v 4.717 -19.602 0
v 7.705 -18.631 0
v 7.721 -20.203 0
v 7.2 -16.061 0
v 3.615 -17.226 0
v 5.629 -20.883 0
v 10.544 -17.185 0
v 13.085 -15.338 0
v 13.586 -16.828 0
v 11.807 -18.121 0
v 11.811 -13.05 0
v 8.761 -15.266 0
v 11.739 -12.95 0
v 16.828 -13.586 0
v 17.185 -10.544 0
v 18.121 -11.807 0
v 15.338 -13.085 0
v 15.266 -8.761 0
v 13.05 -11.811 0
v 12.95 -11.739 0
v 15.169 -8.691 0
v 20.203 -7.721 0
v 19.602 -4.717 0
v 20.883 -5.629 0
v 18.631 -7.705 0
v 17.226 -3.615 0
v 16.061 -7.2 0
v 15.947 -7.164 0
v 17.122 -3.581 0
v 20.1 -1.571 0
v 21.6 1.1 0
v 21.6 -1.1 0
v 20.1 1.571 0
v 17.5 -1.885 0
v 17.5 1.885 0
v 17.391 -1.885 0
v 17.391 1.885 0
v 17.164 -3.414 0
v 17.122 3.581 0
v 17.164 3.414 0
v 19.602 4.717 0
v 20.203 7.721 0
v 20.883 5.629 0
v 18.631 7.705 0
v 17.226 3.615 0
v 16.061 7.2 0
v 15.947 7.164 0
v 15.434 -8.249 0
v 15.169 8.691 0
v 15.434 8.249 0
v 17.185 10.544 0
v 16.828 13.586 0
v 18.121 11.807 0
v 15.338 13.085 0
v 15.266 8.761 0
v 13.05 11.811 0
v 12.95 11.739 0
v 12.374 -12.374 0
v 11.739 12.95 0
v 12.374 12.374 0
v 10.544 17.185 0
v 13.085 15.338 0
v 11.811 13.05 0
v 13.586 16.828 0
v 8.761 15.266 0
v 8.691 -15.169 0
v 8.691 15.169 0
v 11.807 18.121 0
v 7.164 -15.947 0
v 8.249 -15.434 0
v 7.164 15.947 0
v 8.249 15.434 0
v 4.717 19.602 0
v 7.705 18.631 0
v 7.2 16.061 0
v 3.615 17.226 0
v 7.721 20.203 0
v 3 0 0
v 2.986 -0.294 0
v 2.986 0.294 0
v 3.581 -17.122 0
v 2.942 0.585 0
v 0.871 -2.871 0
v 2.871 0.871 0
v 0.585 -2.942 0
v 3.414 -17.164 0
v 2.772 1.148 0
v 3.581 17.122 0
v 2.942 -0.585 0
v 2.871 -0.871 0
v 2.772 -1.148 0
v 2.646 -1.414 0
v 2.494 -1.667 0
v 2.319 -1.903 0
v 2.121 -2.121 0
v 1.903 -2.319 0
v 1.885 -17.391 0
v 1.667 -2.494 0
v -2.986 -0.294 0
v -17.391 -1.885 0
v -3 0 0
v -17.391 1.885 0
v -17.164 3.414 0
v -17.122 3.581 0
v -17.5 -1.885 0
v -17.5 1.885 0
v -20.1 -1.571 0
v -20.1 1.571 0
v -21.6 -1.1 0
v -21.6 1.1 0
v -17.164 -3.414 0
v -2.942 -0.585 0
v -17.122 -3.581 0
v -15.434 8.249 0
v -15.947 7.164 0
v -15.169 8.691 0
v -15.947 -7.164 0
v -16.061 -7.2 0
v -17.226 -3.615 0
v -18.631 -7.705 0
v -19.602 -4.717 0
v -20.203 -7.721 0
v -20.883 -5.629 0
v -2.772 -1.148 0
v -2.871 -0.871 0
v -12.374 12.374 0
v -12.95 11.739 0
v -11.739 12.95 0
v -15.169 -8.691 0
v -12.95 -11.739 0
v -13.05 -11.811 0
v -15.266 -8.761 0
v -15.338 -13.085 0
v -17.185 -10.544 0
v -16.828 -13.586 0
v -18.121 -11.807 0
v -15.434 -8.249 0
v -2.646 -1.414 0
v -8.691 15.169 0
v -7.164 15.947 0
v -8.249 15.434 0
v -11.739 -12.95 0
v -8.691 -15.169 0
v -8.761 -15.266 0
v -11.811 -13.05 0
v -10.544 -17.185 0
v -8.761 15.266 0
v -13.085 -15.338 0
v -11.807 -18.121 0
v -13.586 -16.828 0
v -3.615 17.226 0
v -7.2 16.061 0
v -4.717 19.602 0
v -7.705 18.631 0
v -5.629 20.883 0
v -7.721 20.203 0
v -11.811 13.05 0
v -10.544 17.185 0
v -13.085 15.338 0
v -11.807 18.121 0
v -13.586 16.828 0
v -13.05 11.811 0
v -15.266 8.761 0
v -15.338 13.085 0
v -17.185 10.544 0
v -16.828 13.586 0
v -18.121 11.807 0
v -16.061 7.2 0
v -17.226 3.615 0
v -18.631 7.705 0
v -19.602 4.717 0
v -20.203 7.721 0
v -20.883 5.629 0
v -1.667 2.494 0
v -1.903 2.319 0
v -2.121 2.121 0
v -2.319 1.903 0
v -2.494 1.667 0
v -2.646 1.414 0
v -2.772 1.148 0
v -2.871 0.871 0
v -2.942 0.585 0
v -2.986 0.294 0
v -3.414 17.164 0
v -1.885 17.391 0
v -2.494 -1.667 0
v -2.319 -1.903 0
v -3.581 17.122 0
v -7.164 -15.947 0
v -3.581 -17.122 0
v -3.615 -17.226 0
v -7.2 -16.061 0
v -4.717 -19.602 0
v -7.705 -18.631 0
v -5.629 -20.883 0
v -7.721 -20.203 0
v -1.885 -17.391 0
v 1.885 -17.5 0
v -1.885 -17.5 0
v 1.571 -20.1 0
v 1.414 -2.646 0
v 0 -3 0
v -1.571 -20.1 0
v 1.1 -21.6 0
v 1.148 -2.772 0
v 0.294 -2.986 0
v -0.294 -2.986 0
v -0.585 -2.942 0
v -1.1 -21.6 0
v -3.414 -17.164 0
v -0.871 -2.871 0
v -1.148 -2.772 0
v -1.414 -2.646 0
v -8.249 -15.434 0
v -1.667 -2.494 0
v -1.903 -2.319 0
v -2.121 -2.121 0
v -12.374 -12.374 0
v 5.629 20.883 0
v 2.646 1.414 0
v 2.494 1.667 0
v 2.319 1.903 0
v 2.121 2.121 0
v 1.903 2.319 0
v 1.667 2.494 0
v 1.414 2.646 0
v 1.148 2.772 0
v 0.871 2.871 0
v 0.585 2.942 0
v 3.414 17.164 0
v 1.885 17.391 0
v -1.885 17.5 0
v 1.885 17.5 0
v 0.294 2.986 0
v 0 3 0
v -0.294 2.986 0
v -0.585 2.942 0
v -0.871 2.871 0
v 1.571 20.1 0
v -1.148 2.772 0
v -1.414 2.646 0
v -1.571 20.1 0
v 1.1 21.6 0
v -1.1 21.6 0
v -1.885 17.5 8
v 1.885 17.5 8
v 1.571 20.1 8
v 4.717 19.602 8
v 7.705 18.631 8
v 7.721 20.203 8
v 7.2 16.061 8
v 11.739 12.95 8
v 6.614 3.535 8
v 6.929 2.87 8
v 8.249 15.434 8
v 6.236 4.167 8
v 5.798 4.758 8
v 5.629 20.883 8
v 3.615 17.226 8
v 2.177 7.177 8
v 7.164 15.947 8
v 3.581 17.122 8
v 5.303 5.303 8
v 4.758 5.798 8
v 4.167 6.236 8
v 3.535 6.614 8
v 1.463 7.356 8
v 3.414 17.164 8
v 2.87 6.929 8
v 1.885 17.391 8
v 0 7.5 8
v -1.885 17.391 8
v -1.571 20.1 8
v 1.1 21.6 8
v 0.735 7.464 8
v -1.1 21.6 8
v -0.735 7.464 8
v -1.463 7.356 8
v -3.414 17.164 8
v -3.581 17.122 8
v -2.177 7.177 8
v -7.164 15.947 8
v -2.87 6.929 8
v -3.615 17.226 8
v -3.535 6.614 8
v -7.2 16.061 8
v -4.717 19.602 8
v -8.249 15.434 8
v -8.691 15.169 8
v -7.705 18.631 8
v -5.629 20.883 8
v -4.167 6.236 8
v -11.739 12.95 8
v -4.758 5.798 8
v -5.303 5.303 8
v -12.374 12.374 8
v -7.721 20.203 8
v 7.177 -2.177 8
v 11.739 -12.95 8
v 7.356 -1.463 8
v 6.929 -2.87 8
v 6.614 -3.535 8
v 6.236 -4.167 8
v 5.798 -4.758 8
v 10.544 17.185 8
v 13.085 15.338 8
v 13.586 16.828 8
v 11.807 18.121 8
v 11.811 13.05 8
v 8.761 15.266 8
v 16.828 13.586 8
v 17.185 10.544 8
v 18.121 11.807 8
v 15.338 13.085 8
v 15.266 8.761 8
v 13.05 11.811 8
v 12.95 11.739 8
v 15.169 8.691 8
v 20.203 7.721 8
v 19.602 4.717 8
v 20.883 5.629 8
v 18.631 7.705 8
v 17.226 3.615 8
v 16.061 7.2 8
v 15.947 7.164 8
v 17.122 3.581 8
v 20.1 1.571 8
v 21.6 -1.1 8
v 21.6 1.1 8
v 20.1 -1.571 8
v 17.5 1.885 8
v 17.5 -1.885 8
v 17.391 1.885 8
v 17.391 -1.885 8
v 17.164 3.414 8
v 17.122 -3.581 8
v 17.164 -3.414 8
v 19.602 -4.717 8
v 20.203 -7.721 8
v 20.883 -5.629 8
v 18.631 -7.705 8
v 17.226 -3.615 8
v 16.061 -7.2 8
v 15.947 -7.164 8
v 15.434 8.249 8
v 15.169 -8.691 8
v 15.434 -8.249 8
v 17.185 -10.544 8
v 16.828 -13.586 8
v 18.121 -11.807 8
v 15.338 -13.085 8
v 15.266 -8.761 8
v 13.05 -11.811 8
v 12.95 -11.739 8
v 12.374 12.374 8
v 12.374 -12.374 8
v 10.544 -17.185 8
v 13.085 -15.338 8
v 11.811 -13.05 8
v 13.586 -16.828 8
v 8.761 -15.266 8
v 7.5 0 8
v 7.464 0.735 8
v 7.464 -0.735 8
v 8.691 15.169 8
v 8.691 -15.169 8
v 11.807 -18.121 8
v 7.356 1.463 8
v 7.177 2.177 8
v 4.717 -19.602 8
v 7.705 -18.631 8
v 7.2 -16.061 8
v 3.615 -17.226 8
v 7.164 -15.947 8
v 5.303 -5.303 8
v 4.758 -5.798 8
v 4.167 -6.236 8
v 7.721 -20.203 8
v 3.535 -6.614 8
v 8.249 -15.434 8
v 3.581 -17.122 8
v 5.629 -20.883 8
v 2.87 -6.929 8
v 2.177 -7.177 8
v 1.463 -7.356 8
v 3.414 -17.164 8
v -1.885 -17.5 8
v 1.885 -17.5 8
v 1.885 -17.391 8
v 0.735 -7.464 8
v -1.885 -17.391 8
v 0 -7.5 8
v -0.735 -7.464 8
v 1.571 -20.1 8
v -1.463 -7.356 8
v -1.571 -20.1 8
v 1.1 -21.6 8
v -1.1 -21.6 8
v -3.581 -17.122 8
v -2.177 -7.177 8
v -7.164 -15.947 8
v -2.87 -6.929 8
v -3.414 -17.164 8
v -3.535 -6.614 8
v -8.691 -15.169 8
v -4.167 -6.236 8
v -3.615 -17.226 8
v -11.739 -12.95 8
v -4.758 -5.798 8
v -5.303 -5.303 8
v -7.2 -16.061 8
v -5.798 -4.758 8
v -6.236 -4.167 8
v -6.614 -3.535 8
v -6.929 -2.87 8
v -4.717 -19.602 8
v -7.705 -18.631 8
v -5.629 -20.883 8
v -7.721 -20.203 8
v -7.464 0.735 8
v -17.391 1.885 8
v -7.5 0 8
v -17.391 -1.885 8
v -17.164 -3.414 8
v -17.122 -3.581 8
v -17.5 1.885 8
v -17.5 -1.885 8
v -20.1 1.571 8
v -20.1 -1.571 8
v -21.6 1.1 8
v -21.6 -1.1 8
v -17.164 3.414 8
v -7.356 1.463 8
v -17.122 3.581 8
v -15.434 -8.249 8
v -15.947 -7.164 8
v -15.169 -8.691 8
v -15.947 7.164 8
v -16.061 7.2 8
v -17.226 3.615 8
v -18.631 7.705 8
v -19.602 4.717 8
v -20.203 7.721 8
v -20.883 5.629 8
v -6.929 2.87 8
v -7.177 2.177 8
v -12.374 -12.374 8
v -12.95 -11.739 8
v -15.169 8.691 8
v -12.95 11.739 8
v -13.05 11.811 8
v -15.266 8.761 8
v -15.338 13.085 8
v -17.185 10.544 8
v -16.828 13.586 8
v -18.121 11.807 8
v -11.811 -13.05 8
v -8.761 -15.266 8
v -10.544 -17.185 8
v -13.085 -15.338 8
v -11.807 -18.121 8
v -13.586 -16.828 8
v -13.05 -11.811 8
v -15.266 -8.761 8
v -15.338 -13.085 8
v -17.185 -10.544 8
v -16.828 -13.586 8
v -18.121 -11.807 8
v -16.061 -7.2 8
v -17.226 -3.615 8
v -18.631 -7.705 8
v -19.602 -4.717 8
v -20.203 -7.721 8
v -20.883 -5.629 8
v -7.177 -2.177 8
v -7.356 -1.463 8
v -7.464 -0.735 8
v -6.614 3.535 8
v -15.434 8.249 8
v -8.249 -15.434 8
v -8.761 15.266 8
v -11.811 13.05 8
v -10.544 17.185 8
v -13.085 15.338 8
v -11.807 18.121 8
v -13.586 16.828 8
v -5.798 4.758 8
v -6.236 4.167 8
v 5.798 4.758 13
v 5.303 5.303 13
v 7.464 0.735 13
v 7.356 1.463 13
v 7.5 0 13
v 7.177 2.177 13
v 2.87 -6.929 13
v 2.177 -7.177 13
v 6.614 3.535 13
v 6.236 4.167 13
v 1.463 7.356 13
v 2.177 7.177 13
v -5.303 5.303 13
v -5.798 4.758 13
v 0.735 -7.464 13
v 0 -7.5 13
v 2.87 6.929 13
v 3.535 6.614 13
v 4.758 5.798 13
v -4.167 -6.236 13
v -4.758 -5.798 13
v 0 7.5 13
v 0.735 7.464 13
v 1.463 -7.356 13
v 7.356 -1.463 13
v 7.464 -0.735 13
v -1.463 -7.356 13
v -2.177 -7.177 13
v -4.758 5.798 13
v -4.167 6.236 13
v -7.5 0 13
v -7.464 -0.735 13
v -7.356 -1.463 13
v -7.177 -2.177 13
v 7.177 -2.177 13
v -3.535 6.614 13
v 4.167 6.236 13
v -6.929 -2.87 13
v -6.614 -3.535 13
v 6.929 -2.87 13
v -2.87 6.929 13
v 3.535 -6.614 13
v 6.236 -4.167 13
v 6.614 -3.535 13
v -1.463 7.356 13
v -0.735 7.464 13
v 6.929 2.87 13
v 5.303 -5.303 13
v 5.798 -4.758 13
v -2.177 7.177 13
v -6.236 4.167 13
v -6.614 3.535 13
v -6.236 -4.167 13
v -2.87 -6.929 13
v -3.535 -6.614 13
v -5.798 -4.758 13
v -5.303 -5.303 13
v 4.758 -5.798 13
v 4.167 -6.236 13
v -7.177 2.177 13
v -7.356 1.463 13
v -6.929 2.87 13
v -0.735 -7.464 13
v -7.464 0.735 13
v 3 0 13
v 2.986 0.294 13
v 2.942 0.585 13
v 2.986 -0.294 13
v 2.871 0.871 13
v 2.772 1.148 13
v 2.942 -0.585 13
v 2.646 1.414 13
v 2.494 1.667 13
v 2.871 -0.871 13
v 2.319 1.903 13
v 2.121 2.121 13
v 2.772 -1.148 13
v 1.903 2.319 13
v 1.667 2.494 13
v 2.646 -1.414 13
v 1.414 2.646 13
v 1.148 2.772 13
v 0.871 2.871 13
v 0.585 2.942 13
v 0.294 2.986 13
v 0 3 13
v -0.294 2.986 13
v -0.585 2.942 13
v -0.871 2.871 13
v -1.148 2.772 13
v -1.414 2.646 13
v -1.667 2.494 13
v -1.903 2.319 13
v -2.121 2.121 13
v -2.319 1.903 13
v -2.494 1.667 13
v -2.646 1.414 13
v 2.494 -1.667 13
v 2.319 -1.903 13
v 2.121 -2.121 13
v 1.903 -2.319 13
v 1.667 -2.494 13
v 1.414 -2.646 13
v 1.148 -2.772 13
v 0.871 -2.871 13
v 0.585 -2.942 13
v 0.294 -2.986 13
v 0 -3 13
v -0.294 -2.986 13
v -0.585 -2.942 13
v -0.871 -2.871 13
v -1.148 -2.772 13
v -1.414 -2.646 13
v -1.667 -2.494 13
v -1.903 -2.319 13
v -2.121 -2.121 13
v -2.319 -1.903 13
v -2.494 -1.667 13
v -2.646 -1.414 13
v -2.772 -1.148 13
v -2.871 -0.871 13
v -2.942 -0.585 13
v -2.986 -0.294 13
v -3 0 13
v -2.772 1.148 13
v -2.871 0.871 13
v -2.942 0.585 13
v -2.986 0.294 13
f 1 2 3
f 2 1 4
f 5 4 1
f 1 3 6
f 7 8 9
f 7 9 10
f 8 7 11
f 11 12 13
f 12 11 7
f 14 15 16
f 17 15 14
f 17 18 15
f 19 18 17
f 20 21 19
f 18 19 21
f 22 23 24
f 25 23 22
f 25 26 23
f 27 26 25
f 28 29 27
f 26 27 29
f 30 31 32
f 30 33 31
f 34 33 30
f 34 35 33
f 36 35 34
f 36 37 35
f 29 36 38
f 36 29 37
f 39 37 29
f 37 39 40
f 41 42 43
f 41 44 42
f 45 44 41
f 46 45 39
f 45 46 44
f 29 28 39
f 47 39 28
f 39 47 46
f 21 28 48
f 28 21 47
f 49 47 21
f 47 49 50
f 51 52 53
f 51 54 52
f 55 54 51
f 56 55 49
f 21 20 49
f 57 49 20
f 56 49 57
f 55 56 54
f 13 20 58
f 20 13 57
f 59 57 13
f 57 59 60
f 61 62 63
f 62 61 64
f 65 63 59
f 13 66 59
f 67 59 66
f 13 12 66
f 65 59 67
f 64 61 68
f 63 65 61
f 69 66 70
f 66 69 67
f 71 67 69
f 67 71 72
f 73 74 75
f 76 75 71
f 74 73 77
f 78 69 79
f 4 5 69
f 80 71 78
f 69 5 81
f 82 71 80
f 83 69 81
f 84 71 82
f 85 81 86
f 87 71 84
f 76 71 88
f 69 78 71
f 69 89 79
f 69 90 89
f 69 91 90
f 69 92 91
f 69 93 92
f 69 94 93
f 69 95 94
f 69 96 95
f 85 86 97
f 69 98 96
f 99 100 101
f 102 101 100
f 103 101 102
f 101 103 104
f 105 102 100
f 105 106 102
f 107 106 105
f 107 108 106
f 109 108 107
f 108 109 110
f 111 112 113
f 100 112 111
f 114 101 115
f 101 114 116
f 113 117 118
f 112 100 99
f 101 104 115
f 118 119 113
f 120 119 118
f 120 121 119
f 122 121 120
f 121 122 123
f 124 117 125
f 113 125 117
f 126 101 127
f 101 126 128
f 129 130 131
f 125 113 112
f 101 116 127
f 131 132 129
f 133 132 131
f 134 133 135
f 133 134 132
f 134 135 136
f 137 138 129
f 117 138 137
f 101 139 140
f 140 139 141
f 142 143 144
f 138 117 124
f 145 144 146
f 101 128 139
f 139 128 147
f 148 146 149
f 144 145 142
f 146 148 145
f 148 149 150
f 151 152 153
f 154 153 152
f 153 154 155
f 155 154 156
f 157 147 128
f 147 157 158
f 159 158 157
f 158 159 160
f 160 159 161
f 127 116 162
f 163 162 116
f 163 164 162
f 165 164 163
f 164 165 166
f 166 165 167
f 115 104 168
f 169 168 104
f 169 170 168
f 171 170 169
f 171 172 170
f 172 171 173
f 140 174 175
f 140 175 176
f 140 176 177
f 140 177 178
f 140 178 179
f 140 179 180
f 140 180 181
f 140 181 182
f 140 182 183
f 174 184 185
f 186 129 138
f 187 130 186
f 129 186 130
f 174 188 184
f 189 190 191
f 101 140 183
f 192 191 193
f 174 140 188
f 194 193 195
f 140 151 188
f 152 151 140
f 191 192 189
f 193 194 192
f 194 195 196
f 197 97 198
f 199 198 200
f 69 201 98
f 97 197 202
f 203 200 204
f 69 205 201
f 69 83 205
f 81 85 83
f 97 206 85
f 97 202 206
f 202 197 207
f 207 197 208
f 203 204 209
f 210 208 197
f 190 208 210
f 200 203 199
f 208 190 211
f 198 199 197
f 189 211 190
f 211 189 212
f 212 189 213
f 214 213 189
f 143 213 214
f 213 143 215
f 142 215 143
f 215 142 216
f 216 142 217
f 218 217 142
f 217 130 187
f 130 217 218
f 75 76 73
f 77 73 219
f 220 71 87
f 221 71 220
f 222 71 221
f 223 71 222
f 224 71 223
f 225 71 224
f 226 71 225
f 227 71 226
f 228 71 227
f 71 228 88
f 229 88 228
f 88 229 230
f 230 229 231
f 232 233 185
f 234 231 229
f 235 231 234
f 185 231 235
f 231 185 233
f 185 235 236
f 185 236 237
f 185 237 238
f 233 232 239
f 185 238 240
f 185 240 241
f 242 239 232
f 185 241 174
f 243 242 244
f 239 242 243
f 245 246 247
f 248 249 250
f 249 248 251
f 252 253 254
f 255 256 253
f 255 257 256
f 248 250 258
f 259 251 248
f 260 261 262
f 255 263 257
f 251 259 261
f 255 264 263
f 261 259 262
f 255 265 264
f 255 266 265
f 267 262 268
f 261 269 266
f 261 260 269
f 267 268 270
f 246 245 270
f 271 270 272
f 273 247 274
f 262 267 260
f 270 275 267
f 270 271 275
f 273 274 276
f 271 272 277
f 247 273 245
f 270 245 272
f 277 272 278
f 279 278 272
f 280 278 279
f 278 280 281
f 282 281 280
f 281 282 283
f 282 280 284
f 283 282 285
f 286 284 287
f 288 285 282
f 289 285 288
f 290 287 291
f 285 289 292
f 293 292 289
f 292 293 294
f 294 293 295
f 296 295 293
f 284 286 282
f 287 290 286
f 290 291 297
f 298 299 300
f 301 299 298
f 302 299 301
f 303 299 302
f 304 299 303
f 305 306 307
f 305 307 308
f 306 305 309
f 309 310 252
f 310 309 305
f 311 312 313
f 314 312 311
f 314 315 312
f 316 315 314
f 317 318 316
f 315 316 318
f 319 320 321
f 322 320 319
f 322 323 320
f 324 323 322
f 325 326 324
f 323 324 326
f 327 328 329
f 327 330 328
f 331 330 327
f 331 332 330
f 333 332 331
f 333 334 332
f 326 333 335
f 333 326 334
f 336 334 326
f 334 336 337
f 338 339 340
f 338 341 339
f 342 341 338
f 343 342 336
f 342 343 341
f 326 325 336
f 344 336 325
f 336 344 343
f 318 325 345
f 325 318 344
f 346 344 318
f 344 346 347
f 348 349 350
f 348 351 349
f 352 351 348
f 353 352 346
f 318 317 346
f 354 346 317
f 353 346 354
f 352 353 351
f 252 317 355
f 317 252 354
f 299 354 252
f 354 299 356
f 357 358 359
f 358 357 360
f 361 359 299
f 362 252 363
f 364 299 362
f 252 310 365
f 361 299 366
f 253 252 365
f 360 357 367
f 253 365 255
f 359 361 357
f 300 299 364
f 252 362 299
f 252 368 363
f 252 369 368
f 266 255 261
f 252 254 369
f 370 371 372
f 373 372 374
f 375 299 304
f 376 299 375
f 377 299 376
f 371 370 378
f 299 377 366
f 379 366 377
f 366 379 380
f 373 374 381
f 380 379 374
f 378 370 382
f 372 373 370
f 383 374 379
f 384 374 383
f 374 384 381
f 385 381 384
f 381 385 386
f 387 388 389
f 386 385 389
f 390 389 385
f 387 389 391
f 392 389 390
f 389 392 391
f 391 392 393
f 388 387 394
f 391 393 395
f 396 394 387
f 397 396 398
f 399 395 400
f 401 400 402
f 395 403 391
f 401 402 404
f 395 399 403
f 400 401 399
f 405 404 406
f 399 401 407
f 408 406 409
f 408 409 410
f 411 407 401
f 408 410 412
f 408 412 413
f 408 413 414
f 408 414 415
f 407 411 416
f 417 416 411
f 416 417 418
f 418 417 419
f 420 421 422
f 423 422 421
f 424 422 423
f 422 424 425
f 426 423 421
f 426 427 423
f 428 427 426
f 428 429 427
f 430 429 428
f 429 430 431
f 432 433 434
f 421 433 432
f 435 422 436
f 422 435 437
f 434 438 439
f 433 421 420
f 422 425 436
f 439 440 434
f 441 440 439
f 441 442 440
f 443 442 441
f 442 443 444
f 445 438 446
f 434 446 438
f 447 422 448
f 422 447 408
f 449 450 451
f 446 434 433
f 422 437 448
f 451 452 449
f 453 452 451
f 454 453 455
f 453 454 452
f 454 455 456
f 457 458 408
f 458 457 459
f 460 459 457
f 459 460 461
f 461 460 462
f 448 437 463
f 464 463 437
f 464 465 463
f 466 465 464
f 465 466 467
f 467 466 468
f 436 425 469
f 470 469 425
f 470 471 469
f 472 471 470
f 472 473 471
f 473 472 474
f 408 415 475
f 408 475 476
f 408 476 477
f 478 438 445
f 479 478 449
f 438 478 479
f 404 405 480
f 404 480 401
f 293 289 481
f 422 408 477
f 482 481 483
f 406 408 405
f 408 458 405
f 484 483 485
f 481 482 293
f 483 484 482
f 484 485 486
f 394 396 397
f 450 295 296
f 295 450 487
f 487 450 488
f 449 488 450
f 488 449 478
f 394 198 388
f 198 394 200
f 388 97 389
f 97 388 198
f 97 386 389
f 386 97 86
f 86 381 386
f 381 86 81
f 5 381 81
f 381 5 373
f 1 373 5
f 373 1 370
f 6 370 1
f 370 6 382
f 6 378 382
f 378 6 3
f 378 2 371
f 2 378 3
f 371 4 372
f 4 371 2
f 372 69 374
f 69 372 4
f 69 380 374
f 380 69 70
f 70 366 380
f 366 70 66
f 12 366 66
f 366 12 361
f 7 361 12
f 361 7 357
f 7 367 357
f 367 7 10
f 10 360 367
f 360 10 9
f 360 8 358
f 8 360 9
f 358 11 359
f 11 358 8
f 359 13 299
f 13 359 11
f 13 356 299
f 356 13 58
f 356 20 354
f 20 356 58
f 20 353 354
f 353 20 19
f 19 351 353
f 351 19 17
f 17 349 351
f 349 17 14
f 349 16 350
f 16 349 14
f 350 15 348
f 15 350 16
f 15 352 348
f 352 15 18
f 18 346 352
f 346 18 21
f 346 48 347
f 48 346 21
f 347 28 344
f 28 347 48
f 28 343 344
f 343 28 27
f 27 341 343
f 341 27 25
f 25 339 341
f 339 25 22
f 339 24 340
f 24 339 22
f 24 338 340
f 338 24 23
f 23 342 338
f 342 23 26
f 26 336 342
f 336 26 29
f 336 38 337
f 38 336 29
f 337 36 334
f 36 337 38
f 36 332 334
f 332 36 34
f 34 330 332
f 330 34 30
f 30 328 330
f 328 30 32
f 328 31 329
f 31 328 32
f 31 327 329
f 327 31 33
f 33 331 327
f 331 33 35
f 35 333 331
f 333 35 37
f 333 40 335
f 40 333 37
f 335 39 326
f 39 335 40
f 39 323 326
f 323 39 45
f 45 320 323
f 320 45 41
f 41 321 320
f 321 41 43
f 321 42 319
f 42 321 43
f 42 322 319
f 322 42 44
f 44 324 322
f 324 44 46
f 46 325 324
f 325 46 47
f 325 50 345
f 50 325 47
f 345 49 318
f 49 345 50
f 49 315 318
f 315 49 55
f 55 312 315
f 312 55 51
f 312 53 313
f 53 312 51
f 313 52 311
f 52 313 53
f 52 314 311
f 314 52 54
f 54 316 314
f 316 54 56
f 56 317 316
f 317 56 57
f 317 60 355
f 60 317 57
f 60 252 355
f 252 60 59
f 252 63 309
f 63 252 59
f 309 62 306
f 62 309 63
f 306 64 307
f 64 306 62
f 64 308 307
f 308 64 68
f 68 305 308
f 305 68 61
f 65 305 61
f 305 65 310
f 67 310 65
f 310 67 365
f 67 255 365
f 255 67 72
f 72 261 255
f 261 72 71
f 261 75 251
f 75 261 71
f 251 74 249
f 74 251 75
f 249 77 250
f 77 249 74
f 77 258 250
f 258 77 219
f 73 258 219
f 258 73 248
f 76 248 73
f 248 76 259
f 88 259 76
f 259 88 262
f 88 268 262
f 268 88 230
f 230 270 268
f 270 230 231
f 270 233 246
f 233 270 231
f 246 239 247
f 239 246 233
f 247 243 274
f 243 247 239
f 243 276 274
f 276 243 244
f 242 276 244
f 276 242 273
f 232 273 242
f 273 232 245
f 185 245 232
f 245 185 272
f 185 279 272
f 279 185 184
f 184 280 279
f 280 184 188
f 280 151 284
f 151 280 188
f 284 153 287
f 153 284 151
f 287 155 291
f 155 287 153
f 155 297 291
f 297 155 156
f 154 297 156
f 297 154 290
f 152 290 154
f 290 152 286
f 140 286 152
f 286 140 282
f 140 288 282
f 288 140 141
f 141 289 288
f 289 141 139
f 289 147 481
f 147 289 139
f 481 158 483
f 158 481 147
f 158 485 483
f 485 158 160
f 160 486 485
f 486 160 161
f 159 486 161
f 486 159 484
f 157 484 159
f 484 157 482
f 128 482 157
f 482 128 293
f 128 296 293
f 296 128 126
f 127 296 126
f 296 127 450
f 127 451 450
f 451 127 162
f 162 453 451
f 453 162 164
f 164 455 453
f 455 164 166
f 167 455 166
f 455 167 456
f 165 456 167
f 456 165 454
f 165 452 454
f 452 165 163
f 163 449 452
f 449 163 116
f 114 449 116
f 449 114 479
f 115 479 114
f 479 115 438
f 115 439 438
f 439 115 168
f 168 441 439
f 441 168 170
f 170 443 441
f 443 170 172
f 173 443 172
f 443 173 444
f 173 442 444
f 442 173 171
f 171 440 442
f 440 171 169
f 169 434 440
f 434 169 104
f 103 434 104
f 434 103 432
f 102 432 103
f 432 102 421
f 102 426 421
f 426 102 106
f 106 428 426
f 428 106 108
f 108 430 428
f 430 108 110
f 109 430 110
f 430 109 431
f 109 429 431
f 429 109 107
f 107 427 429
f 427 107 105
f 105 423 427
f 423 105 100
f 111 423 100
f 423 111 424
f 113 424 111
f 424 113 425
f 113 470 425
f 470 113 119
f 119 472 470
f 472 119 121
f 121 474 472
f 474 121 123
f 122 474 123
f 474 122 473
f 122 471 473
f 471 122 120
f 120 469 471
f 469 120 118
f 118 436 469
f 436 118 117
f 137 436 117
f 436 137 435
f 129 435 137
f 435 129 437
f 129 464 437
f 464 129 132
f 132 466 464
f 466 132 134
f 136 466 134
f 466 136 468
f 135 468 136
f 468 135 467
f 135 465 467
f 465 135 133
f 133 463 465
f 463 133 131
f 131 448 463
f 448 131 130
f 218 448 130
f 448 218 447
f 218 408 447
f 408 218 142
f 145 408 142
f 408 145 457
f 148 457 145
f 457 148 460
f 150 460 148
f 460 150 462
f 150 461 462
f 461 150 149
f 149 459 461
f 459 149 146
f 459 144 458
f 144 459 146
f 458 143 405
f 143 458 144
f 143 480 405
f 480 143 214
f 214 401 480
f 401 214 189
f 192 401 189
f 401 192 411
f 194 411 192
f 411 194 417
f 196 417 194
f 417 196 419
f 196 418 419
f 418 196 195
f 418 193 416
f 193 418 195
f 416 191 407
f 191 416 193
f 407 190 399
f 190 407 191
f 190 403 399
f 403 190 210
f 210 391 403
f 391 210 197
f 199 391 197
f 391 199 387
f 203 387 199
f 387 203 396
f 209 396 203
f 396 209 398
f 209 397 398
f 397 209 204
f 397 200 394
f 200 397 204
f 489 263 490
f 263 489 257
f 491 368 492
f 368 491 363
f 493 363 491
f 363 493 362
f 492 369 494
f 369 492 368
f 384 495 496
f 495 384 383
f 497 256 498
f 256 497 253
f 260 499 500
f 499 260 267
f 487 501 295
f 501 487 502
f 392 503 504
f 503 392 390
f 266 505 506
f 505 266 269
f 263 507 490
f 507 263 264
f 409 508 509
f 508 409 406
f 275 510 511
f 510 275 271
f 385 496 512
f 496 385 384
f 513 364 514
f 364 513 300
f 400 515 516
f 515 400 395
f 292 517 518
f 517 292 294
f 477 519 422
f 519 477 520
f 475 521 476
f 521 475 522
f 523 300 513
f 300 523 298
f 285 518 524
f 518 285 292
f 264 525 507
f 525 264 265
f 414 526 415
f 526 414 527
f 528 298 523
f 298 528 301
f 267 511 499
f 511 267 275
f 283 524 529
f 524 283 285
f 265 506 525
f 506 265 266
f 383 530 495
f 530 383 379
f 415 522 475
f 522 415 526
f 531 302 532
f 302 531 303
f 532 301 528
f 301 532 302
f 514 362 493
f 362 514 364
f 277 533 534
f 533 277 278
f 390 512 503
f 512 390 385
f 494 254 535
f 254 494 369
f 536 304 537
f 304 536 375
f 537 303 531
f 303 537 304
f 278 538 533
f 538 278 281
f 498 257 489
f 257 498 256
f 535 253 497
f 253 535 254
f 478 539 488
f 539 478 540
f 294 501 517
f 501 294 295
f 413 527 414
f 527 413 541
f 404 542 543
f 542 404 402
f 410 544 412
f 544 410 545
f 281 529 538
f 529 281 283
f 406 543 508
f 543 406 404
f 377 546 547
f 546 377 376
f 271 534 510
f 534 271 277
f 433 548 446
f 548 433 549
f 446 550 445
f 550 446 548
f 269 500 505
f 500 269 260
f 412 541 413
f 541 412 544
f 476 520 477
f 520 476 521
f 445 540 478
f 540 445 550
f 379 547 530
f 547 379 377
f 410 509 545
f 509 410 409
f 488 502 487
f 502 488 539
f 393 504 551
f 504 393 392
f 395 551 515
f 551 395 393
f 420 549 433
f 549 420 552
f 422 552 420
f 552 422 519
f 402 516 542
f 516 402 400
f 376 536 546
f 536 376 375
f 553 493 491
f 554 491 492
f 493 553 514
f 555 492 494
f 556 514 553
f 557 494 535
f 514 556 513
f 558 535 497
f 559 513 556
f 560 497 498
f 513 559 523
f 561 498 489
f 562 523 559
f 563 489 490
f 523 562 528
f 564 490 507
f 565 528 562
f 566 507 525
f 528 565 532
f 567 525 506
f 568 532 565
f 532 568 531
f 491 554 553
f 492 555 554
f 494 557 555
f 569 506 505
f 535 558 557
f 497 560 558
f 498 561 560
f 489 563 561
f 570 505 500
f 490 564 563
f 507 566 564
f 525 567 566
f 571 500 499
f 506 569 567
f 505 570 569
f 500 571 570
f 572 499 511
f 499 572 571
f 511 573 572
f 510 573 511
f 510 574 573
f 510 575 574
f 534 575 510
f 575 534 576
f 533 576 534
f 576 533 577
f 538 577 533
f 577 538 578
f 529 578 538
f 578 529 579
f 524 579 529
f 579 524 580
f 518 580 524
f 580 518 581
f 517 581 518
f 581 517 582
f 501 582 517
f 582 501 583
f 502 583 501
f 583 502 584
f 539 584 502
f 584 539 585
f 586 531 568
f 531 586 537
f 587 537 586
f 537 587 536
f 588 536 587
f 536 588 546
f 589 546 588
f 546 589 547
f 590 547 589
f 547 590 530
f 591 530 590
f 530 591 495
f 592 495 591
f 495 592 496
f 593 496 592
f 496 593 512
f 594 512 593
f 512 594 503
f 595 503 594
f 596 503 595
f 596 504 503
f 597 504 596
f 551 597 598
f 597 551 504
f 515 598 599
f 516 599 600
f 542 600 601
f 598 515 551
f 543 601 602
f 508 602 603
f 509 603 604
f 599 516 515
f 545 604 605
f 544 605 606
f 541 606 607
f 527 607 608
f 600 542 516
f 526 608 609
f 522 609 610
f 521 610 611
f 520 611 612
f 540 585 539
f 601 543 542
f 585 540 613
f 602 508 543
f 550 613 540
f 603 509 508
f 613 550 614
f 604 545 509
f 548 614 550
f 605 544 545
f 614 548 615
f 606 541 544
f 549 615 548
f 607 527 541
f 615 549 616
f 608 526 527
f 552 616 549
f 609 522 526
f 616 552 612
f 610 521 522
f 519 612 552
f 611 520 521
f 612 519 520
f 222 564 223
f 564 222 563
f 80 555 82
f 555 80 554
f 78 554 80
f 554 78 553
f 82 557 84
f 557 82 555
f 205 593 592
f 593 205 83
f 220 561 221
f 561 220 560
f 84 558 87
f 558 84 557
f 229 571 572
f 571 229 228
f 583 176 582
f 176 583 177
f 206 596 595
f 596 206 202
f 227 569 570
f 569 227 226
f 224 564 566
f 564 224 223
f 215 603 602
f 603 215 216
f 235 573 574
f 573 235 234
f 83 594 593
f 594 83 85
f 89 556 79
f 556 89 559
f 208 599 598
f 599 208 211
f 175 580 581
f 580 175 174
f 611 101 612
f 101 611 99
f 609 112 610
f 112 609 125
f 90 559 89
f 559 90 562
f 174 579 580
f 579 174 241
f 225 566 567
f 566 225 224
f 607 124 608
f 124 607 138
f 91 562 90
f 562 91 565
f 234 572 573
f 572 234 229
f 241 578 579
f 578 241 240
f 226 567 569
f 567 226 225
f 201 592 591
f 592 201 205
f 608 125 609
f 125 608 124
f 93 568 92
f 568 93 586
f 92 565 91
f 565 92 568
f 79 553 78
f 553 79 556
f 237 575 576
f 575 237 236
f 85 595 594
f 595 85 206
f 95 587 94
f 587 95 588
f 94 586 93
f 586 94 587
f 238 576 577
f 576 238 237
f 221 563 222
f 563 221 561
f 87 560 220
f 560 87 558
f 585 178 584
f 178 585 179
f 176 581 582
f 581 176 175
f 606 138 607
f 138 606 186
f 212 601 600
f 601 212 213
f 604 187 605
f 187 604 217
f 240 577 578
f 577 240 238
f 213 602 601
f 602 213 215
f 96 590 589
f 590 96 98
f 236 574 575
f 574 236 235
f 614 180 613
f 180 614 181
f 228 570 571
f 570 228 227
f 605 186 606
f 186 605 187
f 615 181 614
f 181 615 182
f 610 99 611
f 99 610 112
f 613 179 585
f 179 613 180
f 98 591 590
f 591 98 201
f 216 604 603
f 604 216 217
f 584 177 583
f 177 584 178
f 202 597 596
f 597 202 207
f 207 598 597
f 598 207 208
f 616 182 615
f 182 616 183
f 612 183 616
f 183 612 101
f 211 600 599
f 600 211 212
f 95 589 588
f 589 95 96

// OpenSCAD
// Parametric involute spur gear
// Proper involute tooth profile for meshing gears

num_teeth = 20;
module_size = 2;  // Metric module (pitch diameter / teeth)
pressure_angle = 20;
gear_thickness = 8;
shaft_diameter = 6;
hub_diameter = 15;
hub_height = 5;

$fn = 64;

// Derived dimensions
pitch_diameter = num_teeth * module_size;
outer_diameter = pitch_diameter + 2 * module_size;
root_diameter = pitch_diameter - 2.5 * module_size;

module involute_gear() {
    difference() {
        union() {
            // Gear body with teeth
            linear_extrude(height=gear_thickness)
            gear_2d();
            
            // Hub
            cylinder(d=hub_diameter, h=gear_thickness + hub_height);
        }
        
        // Shaft hole
        translate([0, 0, -1])
        cylinder(d=shaft_diameter, h=gear_thickness + hub_height + 2);
    }
}

module gear_2d() {
    difference() {
        union() {
            circle(d=root_diameter);
            for (i = [0:num_teeth-1]) {
                rotate([0, 0, i * 360/num_teeth])
                gear_tooth();
            }
        }
    }
}

module gear_tooth() {
    tooth_width = module_size * 3.14159 / 2;
    
    // Simplified involute tooth profile
    hull() {
        translate([0, root_diameter/2 - 0.1, 0])
        square([tooth_width * 1.2, 0.2], center=true);
        
        translate([0, pitch_diameter/2, 0])
        square([tooth_width, 0.2], center=true);
        
        translate([0, outer_diameter/2 - 0.5, 0])
        square([tooth_width * 0.7, 0.2], center=true);
    }
}

involute_gear();
